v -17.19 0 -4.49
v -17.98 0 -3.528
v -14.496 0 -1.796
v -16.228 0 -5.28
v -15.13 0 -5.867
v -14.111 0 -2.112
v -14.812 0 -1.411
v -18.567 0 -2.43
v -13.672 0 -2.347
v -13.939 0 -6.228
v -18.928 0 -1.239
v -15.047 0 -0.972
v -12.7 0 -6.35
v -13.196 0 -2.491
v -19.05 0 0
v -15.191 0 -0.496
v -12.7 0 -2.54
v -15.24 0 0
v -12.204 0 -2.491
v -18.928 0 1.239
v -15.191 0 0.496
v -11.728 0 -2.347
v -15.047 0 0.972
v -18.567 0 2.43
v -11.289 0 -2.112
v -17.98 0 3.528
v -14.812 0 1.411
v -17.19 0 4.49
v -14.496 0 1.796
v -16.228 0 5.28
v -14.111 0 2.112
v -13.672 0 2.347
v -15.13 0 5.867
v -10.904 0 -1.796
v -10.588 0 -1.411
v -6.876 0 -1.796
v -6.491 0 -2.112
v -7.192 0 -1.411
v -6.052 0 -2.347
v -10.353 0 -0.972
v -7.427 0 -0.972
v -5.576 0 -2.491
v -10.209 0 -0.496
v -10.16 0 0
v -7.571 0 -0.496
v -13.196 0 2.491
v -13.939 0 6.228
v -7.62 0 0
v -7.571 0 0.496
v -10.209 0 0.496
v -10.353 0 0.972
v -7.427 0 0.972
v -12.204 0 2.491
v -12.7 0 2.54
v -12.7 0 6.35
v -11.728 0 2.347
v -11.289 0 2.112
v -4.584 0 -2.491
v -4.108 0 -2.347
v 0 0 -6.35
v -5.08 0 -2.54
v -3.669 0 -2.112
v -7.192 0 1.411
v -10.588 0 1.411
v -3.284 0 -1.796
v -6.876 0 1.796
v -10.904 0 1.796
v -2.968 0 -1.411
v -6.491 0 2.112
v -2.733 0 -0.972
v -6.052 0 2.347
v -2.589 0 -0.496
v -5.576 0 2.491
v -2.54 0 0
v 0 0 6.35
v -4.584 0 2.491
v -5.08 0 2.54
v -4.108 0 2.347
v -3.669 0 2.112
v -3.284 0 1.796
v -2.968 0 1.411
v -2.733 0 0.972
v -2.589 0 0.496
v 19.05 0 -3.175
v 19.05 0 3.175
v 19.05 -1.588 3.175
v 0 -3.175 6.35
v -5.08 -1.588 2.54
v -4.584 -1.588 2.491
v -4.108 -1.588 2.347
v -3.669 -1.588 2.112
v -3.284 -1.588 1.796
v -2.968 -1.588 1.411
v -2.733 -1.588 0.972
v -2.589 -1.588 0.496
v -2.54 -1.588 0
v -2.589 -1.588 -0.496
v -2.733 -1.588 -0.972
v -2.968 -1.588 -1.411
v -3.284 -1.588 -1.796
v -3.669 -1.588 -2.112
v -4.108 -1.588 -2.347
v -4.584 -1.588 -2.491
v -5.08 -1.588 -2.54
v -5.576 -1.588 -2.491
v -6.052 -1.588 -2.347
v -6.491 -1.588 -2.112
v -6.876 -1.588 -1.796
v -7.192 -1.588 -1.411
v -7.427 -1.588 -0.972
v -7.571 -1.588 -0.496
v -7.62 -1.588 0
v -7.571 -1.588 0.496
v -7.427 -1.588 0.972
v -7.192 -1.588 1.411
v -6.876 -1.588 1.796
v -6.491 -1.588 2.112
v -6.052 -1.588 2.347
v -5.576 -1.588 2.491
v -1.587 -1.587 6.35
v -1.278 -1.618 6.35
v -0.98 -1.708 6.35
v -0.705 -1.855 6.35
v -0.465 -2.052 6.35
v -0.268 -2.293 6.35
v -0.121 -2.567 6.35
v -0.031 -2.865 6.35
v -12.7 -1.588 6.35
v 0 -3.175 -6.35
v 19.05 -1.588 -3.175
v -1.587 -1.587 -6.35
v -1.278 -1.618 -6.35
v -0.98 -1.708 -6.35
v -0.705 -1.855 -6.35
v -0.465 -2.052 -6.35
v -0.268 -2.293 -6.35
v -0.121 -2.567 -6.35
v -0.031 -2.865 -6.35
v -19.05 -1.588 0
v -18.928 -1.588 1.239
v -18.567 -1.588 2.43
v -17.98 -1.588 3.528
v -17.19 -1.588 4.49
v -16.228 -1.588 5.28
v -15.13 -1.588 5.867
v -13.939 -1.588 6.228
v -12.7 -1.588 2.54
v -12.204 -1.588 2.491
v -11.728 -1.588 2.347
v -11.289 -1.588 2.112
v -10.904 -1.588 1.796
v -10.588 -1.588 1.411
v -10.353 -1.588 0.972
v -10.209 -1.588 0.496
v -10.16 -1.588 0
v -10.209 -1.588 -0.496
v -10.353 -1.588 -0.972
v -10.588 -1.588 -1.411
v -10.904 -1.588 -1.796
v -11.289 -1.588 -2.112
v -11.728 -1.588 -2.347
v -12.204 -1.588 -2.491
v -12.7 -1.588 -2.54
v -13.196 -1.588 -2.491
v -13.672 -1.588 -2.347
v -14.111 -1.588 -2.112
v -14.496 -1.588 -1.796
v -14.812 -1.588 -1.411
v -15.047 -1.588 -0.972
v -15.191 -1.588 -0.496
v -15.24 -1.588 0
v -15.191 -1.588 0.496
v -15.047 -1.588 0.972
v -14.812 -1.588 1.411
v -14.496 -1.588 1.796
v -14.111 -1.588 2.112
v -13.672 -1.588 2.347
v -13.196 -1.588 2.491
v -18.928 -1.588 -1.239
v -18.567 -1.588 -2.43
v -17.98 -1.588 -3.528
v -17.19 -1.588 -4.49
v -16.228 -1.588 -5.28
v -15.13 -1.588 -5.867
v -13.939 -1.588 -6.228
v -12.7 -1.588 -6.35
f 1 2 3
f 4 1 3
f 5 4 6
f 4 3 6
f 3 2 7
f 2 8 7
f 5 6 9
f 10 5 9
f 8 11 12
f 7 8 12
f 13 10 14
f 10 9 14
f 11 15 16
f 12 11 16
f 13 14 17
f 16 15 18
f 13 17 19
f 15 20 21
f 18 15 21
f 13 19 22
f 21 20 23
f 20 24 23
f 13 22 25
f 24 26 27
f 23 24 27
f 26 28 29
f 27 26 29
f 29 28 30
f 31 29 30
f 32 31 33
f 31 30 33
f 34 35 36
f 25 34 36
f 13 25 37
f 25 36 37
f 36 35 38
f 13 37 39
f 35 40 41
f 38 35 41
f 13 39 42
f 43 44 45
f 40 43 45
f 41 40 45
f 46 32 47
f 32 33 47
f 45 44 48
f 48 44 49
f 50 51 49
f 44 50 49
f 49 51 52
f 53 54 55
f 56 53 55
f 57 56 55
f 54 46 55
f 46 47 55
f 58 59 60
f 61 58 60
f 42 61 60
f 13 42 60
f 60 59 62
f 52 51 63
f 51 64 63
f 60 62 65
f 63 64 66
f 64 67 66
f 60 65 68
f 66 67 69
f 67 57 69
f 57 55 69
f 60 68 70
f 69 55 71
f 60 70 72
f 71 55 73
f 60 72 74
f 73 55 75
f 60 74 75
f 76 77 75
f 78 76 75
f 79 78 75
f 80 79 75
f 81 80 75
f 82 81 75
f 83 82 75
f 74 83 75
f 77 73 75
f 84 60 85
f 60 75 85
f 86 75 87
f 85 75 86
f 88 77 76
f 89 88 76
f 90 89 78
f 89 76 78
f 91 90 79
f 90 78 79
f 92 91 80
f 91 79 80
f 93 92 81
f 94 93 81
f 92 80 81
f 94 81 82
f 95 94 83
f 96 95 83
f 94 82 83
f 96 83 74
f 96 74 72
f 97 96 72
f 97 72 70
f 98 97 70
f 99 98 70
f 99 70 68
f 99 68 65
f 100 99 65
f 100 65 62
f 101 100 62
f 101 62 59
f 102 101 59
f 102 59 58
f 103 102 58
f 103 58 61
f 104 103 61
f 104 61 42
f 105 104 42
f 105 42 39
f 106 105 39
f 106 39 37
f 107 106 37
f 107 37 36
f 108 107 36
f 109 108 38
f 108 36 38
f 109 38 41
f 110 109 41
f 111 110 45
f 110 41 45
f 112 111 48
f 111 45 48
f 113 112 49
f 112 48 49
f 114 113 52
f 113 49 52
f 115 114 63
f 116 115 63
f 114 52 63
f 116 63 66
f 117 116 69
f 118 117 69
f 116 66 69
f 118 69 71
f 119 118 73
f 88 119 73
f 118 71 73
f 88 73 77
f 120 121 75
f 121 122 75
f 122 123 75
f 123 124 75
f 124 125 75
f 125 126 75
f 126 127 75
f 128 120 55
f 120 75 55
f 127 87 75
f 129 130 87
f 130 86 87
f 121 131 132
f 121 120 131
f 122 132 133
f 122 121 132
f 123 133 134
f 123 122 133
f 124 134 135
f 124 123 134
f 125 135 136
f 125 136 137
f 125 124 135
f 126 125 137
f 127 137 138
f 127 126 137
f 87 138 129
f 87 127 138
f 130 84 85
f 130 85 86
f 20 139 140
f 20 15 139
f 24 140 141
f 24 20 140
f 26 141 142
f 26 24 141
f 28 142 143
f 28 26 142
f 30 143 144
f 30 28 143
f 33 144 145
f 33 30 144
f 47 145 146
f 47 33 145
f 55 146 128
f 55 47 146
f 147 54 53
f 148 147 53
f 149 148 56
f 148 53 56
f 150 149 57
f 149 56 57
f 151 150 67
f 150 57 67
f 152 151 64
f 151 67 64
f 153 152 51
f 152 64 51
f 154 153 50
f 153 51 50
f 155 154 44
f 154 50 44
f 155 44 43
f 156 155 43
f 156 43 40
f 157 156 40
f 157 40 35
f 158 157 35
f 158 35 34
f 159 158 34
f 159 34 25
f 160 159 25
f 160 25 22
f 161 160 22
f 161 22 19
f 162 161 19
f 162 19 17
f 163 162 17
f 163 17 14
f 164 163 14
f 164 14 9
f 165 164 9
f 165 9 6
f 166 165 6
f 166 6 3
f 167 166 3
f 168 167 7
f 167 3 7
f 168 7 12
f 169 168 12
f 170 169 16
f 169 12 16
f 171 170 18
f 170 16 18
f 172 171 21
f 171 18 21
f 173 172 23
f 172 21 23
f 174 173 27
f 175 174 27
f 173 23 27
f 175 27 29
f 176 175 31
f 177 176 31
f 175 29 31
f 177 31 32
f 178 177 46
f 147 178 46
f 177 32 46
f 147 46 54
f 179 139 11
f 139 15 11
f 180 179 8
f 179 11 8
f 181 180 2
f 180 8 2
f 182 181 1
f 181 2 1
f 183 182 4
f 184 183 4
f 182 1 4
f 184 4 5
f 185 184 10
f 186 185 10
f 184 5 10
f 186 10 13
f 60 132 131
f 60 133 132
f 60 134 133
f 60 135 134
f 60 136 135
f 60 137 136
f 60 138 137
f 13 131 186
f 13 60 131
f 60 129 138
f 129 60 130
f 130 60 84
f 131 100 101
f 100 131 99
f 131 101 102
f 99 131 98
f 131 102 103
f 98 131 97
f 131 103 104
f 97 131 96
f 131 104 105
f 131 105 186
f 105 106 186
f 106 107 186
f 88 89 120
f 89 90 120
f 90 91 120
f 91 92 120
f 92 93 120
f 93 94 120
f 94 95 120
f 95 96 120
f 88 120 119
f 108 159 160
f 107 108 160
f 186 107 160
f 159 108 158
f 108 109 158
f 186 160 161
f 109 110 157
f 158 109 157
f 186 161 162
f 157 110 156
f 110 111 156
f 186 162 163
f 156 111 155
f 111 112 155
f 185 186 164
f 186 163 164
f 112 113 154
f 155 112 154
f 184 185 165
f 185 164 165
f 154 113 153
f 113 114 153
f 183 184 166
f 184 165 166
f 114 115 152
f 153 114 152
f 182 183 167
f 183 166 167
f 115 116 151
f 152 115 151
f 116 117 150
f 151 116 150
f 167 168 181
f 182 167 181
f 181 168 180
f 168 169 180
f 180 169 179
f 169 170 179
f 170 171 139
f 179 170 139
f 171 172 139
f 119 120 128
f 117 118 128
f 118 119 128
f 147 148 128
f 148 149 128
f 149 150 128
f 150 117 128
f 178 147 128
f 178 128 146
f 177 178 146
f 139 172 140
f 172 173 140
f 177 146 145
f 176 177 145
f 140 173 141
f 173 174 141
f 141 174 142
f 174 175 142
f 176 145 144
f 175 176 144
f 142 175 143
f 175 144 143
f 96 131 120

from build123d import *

# Parameters (mm, degrees)
BOSS_EXTRUDE1_DEPTH = 6.35
CUT_EXTRUDE1_DEPTH  = 12.7
FILLET1_R           = 6.35
FILLET2_R           = 1.5875
SKETCH3_R           = 2.54
CUT_EXTRUDE2_DEPTH  = 12.7


with BuildPart() as part:
    # Sketch1 → Boss-Extrude1 (new, symmetric)
    with BuildSketch(Plane.XY):
        Polygon((-19.05, 0), (19.05, 0), (19.05, -1.5875), (0, -3.175), (0, -1.5875), (-19.05, -1.5875), align=None)
    extrude(amount=BOSS_EXTRUDE1_DEPTH, both=True)

    # Sketch2 → Cut-Extrude1 (cut)
    with BuildSketch(Plane(origin=(0, 0, 0), x_dir=(1, 0, 0), z_dir=(0, 1, 0))):
        Polygon((0, 6.35), (19.05, 3.175), (19.05, 6.35), align=None)
    cut_extrude1 = extrude(amount=-CUT_EXTRUDE1_DEPTH, mode=Mode.SUBTRACT)

    # Mirror1: Cut-Extrude1 across plane
    add(cut_extrude1.mirror(Plane.XY), mode=Mode.SUBTRACT)

    # Fillet1
    fillet1_edges = [part.edges().sort_by_distance(p)[0] for p in [
        (-19.05, -0.79375, -6.35),
        (-19.05, -0.79375, 6.35),
    ]]
    fillet(fillet1_edges, radius=FILLET1_R - 0.0001)  # a hair under: the kernel refuses the full size

    # Fillet2
    fillet2_edges = [part.edges().sort_by_distance(p)[0] for p in [
        (0, -1.5875, 0),
    ]]
    fillet(fillet2_edges, radius=FILLET2_R - 0.0001)  # a hair under: the kernel refuses the full size

    # Sketch3 → Cut-Extrude2 (cut)
    with BuildSketch(Plane(origin=(0, 0, 0), x_dir=(1, 0, 0), z_dir=(0, 1, 0))):
        with Locations(Location((-12.7, 0, 0), (0, 0, 270))):
            Circle(SKETCH3_R)
        with Locations(Location((-5.08, 0, 0), (0, 0, 270))):
            Circle(SKETCH3_R)
    extrude(amount=-CUT_EXTRUDE2_DEPTH, mode=Mode.SUBTRACT)


solid = part.part
